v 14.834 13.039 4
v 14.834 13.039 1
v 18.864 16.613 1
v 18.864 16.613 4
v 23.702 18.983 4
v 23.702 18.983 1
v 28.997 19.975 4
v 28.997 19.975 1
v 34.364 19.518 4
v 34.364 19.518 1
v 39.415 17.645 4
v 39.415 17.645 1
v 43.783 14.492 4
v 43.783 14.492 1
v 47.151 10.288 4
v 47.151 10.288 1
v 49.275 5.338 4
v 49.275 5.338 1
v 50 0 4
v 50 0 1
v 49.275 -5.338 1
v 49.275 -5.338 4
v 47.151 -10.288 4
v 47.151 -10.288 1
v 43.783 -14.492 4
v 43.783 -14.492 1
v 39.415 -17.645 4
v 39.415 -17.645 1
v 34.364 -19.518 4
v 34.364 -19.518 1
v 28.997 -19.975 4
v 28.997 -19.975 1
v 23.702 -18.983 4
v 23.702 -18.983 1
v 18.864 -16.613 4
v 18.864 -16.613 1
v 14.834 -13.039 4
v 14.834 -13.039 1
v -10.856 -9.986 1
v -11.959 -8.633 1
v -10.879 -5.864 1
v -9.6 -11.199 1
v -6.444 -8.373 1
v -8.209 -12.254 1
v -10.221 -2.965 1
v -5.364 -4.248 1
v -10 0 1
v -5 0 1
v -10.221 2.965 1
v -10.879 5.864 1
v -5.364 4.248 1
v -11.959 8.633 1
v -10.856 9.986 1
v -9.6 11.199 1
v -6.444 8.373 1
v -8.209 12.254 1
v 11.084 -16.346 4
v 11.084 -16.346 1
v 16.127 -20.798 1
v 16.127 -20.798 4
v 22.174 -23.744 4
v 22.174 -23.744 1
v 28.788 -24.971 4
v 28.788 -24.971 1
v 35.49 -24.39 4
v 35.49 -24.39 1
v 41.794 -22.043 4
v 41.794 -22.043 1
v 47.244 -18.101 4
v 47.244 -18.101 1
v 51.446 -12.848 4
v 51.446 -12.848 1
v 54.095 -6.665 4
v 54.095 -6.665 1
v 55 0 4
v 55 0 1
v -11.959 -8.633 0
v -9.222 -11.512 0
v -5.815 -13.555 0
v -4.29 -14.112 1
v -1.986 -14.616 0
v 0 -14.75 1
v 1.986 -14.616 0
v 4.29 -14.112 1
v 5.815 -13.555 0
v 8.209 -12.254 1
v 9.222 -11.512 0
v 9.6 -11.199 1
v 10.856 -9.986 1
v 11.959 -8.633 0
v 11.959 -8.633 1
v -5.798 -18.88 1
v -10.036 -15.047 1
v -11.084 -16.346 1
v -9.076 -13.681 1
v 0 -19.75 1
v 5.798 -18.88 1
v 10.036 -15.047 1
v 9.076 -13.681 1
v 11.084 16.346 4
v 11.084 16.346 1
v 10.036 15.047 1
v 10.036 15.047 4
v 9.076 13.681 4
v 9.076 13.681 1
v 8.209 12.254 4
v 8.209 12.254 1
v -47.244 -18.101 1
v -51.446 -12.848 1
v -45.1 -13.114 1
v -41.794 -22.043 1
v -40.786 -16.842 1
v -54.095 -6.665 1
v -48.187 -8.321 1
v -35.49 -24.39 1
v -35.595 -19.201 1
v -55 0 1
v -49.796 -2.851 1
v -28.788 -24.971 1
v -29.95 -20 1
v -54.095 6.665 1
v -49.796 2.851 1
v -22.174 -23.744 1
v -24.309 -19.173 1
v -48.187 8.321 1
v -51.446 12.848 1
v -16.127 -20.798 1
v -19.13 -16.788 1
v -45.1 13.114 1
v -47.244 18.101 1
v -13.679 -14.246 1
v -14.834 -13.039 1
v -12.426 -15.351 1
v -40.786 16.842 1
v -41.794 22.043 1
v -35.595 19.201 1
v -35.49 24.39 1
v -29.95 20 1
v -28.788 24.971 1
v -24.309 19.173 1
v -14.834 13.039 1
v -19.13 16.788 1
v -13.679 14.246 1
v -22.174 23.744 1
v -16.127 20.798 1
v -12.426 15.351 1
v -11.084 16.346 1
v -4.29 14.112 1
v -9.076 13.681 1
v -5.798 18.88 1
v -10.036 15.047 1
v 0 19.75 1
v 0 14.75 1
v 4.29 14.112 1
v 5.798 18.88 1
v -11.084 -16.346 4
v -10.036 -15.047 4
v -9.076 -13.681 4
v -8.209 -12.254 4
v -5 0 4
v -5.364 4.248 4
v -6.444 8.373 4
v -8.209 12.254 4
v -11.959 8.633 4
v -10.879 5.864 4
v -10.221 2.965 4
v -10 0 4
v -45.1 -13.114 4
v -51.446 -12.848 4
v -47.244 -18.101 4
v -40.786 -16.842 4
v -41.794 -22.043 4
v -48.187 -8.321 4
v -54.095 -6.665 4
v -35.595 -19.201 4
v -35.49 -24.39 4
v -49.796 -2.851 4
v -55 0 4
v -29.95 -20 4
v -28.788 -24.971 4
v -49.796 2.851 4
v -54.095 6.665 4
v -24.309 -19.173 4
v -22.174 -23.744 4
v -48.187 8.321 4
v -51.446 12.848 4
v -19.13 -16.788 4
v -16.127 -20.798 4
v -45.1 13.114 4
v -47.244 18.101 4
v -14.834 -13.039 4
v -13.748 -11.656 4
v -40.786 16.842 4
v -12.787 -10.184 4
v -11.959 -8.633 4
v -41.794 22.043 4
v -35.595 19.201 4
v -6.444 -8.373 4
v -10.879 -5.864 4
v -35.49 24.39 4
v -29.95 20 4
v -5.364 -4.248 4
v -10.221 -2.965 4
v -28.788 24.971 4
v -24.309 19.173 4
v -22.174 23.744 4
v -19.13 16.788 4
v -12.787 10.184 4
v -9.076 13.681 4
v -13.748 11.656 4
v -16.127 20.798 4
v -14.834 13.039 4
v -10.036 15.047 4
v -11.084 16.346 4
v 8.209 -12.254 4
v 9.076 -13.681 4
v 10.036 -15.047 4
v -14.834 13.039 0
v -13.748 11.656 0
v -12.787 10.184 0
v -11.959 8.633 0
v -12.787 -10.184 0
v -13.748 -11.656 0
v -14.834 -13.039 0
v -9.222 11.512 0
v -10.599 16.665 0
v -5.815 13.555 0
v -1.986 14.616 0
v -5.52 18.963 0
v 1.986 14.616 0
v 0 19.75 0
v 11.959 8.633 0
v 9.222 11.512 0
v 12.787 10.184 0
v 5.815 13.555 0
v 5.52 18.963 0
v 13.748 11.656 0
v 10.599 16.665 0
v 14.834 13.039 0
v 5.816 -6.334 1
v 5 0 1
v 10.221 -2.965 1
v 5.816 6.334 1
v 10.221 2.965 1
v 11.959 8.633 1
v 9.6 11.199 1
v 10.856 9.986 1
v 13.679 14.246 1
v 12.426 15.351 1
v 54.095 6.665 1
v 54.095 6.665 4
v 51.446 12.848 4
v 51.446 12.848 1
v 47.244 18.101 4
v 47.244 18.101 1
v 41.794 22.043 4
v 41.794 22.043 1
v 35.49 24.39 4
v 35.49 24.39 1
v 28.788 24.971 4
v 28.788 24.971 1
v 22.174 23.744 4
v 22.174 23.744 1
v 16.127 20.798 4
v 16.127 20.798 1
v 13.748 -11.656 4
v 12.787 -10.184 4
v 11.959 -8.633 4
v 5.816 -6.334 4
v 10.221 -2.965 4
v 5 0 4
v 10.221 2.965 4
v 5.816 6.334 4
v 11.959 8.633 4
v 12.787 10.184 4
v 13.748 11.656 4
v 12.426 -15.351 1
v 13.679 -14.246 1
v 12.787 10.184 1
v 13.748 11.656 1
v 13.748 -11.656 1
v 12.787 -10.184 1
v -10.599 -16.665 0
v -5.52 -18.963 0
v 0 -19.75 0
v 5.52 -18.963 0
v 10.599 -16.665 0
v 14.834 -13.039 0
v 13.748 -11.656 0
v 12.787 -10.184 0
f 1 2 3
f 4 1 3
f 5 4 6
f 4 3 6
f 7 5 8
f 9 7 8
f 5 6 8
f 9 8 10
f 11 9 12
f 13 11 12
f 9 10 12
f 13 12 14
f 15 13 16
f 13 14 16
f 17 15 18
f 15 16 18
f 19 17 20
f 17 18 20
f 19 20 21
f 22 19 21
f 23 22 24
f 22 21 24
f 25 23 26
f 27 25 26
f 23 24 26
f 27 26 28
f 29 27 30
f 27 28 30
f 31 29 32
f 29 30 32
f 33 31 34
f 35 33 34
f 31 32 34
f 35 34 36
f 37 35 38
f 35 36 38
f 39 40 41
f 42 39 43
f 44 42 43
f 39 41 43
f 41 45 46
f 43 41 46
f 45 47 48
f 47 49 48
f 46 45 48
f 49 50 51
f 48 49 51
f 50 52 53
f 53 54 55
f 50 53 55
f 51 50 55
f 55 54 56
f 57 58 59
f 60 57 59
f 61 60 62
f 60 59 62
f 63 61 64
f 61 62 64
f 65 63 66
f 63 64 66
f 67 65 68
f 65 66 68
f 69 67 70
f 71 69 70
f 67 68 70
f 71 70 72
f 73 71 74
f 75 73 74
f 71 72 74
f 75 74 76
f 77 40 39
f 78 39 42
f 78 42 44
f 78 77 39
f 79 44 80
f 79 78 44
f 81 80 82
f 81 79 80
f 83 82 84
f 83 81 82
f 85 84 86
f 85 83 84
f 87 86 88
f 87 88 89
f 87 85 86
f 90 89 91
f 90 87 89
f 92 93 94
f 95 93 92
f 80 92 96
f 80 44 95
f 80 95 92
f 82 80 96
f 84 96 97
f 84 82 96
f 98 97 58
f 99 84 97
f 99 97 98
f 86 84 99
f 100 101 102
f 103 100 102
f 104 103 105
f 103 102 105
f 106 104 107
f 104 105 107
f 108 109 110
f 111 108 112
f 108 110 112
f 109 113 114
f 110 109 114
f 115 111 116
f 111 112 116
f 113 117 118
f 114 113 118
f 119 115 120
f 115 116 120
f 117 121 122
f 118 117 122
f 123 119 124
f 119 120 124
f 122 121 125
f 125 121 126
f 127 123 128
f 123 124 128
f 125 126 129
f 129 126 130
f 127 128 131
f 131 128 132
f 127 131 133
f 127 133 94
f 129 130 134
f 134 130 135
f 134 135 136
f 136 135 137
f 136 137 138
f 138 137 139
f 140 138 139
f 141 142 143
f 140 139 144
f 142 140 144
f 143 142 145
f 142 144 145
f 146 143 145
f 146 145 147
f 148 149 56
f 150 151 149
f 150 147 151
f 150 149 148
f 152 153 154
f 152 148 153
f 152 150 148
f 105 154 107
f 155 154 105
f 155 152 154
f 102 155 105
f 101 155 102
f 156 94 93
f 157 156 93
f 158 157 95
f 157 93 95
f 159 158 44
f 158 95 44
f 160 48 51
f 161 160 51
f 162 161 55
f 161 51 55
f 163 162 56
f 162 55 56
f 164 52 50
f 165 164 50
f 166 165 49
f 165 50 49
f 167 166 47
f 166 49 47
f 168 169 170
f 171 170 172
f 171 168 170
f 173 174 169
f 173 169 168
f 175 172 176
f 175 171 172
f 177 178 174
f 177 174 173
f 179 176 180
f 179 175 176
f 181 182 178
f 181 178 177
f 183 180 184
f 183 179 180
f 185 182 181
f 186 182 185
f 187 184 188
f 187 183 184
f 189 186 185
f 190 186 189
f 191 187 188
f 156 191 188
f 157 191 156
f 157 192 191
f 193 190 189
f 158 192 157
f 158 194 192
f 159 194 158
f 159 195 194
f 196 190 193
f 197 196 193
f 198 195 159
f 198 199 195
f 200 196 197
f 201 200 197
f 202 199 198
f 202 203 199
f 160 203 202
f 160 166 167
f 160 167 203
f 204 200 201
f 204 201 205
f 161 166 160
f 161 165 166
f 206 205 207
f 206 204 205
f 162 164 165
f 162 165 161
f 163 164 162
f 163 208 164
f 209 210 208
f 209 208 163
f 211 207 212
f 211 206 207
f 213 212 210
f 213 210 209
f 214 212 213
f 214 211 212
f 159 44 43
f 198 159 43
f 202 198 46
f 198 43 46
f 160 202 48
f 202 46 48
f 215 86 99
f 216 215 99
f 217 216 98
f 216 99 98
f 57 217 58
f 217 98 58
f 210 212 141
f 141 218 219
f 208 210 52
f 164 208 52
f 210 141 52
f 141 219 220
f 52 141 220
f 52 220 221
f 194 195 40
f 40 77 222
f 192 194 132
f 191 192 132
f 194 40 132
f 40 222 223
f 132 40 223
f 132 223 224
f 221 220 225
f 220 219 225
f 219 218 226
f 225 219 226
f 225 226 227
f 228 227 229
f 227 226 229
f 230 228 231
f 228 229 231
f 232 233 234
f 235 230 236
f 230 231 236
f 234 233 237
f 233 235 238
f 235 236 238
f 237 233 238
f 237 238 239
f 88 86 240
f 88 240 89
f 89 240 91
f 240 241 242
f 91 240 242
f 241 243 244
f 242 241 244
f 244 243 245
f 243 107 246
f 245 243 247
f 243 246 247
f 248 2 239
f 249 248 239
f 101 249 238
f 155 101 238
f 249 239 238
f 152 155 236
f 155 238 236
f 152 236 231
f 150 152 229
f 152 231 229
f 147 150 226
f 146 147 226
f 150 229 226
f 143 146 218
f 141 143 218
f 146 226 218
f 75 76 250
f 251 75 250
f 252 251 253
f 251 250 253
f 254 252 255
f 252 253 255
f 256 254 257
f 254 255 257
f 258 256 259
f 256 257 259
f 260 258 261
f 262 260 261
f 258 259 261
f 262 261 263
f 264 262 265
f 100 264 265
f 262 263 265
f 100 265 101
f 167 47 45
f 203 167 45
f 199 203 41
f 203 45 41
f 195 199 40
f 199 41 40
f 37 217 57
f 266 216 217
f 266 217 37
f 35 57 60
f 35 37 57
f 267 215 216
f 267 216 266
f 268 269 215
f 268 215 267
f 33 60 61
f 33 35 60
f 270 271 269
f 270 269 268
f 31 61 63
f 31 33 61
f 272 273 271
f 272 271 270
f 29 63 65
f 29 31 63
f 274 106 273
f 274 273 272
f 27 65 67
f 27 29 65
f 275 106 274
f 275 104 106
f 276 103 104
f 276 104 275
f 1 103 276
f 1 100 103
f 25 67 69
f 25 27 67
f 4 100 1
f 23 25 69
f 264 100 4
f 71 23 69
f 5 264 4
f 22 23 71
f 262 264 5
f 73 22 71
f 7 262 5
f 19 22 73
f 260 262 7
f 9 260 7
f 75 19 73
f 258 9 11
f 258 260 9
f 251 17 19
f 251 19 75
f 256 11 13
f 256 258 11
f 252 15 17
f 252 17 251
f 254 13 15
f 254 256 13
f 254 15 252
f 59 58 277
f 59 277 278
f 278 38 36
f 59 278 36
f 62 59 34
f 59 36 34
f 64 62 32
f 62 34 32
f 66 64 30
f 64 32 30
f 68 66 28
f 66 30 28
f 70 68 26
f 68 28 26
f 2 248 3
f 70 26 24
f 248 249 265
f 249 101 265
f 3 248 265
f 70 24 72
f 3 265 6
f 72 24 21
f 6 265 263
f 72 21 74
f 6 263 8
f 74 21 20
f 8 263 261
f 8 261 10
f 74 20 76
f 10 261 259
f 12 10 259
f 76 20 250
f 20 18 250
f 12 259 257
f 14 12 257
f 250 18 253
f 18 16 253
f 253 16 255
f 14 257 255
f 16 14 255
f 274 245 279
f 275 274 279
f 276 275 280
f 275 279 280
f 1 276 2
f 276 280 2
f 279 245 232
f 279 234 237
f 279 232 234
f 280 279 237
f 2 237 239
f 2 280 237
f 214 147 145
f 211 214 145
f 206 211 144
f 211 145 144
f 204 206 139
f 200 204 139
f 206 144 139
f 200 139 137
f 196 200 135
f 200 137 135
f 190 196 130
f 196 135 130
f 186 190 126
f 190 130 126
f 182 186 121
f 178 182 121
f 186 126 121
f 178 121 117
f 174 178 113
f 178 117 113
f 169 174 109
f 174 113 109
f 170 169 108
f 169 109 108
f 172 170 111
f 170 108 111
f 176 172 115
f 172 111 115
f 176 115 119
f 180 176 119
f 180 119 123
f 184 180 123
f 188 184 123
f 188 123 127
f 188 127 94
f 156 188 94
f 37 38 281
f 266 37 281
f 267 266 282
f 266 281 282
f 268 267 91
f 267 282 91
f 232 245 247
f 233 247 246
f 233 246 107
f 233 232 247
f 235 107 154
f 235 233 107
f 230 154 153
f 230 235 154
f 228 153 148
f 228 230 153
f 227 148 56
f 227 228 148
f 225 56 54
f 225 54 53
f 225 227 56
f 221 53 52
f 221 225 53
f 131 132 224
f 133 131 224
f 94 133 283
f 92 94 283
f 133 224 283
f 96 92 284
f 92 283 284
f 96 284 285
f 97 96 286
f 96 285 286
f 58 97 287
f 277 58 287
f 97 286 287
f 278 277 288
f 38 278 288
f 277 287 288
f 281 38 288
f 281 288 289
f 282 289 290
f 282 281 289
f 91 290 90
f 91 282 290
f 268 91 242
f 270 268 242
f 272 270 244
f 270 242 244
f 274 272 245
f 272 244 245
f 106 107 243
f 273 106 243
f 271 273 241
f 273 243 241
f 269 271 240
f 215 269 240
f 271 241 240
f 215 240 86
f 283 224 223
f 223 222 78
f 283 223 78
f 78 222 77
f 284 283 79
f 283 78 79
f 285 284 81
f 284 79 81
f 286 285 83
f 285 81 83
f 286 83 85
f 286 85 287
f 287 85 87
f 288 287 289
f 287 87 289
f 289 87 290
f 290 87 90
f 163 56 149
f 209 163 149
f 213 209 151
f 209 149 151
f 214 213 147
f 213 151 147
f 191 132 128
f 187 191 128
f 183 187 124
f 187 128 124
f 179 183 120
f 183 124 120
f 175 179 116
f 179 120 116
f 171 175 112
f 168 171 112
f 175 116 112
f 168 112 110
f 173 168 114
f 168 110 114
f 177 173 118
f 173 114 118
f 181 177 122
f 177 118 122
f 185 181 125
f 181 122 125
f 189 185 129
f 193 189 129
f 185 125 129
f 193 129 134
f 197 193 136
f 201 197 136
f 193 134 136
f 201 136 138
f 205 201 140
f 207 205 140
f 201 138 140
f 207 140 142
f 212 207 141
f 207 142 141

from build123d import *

# Parameters (mm, degrees)
F0_R     = 19.75
F0_R_2   = 14.75
F1_DEPTH = 1
F3_DEPTH = 3
F4_DEPTH = 25


with BuildPart() as f1:
    # F0 (on Top) → F1 (new body)
    with BuildSketch(Plane.XY):
        Circle(F0_R)
        Circle(F0_R_2, mode=Mode.SUBTRACT)
    extrude(amount=F1_DEPTH)

    # F2 (on face) → F3 (join)
    with BuildSketch(Plane.XY.offset(1)):
        with BuildLine():
            ThreePointArc((-14.834375, -13.038551237), (-50, 0), (-14.834375, 13.038551237))
            ThreePointArc((-14.834375, 13.038551237), (-13.0644777856, 14.8115468533), (-11.084375, 16.346226808))
            ThreePointArc((-11.084375, 16.346226808), (-55, 0), (-11.084375, -16.346226808))
            ThreePointArc((-11.084375, -16.346226808), (-13.0644777856, -14.8115468533), (-14.834375, -13.038551237))
        make_face()
        with BuildLine():
            ThreePointArc((-11.959375, 8.6334147132), (-10.4959940012, 4.4264828024), (-10, 0))
            ThreePointArc((-10, 0), (-10.4959940012, -4.4264828024), (-11.959375, -8.6334147132))
            ThreePointArc((-11.959375, -8.6334147132), (-10.2456029754, -10.6108491493), (-8.209375, -12.2543323812))
            ThreePointArc((-8.209375, -12.2543323812), (-5.8156494298, -6.3338130301), (-5, 0))
            ThreePointArc((-5, 0), (-5.8156494298, 6.3338130301), (-8.209375, 12.2543323812))
            ThreePointArc((-8.209375, 12.2543323812), (-10.2456029754, 10.6108491493), (-11.959375, 8.6334147132))
        make_face()
        with BuildLine():
            ThreePointArc((-14.834375, 13.038551237), (-13.2514159788, 10.9309163974), (-11.959375, 8.6334147132))
            ThreePointArc((-11.959375, 8.6334147132), (-10.2456029754, 10.6108491493), (-8.209375, 12.2543323812))
            ThreePointArc((-8.209375, 12.2543323812), (-9.5443015943, 14.3723485462), (-11.084375, 16.346226808))
            ThreePointArc((-11.084375, 16.346226808), (-13.0644777856, 14.8115468533), (-14.834375, 13.038551237))
        make_face()
        with BuildLine():
            ThreePointArc((-8.209375, -12.2543323812), (-10.2456029754, -10.6108491493), (-11.959375, -8.6334147132))
            ThreePointArc((-11.959375, -8.6334147132), (-13.2514159788, -10.9309163974), (-14.834375, -13.038551237))
            ThreePointArc((-14.834375, -13.038551237), (-13.0644777856, -14.8115468533), (-11.084375, -16.346226808))
            ThreePointArc((-11.084375, -16.346226808), (-9.5443015943, -14.3723485462), (-8.209375, -12.2543323812))
        make_face()
        with BuildLine():
            ThreePointArc((55, 0), (38.7209338663, 23.4295819958), (11.084375, 16.346226808))
            ThreePointArc((11.084375, 16.346226808), (13.0644777856, 14.8115468533), (14.834375, 13.038551237))
            ThreePointArc((14.834375, 13.038551237), (36.9529669926, 18.7524998334), (50, 0))
            ThreePointArc((50, 0), (36.9529669926, -18.7524998334), (14.834375, -13.038551237))
            ThreePointArc((14.834375, -13.038551237), (13.0644777856, -14.8115468533), (11.084375, -16.346226808))
            ThreePointArc((11.084375, -16.346226808), (38.7209338663, -23.4295819958), (55, 0))
        make_face()
        with BuildLine():
            ThreePointArc((11.959375, -8.6334147132), (10.2456029754, -10.6108491493), (8.209375, -12.2543323812))
            ThreePointArc((8.209375, -12.2543323812), (9.5443015943, -14.3723485462), (11.084375, -16.346226808))
            ThreePointArc((11.084375, -16.346226808), (13.0644777856, -14.8115468533), (14.834375, -13.038551237))
            ThreePointArc((14.834375, -13.038551237), (13.2514159788, -10.9309163974), (11.959375, -8.6334147132))
        make_face()
        with BuildLine():
            ThreePointArc((11.959375, 8.6334147132), (10.2456029754, 10.6108491493), (8.209375, 12.2543323812))
            ThreePointArc((8.209375, 12.2543323812), (5, 0), (8.209375, -12.2543323812))
            ThreePointArc((8.209375, -12.2543323812), (10.2456029754, -10.6108491493), (11.959375, -8.6334147132))
            ThreePointArc((11.959375, -8.6334147132), (10, 0), (11.959375, 8.6334147132))
        make_face()
        with BuildLine():
            ThreePointArc((11.084375, 16.346226808), (9.5443015943, 14.3723485462), (8.209375, 12.2543323812))
            ThreePointArc((8.209375, 12.2543323812), (10.2456029754, 10.6108491493), (11.959375, 8.6334147132))
            ThreePointArc((11.959375, 8.6334147132), (13.2514159788, 10.9309163974), (14.834375, 13.038551237))
            ThreePointArc((14.834375, 13.038551237), (13.0644777856, 14.8115468533), (11.084375, 16.346226808))
        make_face()
    extrude(amount=F3_DEPTH)

    # F4 (cut): faces of the model
    f4_faces = [f1.faces().sort_by_distance(p)[0] for p in [
        (16.0717214062, 0, 1),
        (-16.0717214062, 0, 1),
    ]]
    extrude(f4_faces, amount=-F4_DEPTH, mode=Mode.SUBTRACT)


solid = f1.part
